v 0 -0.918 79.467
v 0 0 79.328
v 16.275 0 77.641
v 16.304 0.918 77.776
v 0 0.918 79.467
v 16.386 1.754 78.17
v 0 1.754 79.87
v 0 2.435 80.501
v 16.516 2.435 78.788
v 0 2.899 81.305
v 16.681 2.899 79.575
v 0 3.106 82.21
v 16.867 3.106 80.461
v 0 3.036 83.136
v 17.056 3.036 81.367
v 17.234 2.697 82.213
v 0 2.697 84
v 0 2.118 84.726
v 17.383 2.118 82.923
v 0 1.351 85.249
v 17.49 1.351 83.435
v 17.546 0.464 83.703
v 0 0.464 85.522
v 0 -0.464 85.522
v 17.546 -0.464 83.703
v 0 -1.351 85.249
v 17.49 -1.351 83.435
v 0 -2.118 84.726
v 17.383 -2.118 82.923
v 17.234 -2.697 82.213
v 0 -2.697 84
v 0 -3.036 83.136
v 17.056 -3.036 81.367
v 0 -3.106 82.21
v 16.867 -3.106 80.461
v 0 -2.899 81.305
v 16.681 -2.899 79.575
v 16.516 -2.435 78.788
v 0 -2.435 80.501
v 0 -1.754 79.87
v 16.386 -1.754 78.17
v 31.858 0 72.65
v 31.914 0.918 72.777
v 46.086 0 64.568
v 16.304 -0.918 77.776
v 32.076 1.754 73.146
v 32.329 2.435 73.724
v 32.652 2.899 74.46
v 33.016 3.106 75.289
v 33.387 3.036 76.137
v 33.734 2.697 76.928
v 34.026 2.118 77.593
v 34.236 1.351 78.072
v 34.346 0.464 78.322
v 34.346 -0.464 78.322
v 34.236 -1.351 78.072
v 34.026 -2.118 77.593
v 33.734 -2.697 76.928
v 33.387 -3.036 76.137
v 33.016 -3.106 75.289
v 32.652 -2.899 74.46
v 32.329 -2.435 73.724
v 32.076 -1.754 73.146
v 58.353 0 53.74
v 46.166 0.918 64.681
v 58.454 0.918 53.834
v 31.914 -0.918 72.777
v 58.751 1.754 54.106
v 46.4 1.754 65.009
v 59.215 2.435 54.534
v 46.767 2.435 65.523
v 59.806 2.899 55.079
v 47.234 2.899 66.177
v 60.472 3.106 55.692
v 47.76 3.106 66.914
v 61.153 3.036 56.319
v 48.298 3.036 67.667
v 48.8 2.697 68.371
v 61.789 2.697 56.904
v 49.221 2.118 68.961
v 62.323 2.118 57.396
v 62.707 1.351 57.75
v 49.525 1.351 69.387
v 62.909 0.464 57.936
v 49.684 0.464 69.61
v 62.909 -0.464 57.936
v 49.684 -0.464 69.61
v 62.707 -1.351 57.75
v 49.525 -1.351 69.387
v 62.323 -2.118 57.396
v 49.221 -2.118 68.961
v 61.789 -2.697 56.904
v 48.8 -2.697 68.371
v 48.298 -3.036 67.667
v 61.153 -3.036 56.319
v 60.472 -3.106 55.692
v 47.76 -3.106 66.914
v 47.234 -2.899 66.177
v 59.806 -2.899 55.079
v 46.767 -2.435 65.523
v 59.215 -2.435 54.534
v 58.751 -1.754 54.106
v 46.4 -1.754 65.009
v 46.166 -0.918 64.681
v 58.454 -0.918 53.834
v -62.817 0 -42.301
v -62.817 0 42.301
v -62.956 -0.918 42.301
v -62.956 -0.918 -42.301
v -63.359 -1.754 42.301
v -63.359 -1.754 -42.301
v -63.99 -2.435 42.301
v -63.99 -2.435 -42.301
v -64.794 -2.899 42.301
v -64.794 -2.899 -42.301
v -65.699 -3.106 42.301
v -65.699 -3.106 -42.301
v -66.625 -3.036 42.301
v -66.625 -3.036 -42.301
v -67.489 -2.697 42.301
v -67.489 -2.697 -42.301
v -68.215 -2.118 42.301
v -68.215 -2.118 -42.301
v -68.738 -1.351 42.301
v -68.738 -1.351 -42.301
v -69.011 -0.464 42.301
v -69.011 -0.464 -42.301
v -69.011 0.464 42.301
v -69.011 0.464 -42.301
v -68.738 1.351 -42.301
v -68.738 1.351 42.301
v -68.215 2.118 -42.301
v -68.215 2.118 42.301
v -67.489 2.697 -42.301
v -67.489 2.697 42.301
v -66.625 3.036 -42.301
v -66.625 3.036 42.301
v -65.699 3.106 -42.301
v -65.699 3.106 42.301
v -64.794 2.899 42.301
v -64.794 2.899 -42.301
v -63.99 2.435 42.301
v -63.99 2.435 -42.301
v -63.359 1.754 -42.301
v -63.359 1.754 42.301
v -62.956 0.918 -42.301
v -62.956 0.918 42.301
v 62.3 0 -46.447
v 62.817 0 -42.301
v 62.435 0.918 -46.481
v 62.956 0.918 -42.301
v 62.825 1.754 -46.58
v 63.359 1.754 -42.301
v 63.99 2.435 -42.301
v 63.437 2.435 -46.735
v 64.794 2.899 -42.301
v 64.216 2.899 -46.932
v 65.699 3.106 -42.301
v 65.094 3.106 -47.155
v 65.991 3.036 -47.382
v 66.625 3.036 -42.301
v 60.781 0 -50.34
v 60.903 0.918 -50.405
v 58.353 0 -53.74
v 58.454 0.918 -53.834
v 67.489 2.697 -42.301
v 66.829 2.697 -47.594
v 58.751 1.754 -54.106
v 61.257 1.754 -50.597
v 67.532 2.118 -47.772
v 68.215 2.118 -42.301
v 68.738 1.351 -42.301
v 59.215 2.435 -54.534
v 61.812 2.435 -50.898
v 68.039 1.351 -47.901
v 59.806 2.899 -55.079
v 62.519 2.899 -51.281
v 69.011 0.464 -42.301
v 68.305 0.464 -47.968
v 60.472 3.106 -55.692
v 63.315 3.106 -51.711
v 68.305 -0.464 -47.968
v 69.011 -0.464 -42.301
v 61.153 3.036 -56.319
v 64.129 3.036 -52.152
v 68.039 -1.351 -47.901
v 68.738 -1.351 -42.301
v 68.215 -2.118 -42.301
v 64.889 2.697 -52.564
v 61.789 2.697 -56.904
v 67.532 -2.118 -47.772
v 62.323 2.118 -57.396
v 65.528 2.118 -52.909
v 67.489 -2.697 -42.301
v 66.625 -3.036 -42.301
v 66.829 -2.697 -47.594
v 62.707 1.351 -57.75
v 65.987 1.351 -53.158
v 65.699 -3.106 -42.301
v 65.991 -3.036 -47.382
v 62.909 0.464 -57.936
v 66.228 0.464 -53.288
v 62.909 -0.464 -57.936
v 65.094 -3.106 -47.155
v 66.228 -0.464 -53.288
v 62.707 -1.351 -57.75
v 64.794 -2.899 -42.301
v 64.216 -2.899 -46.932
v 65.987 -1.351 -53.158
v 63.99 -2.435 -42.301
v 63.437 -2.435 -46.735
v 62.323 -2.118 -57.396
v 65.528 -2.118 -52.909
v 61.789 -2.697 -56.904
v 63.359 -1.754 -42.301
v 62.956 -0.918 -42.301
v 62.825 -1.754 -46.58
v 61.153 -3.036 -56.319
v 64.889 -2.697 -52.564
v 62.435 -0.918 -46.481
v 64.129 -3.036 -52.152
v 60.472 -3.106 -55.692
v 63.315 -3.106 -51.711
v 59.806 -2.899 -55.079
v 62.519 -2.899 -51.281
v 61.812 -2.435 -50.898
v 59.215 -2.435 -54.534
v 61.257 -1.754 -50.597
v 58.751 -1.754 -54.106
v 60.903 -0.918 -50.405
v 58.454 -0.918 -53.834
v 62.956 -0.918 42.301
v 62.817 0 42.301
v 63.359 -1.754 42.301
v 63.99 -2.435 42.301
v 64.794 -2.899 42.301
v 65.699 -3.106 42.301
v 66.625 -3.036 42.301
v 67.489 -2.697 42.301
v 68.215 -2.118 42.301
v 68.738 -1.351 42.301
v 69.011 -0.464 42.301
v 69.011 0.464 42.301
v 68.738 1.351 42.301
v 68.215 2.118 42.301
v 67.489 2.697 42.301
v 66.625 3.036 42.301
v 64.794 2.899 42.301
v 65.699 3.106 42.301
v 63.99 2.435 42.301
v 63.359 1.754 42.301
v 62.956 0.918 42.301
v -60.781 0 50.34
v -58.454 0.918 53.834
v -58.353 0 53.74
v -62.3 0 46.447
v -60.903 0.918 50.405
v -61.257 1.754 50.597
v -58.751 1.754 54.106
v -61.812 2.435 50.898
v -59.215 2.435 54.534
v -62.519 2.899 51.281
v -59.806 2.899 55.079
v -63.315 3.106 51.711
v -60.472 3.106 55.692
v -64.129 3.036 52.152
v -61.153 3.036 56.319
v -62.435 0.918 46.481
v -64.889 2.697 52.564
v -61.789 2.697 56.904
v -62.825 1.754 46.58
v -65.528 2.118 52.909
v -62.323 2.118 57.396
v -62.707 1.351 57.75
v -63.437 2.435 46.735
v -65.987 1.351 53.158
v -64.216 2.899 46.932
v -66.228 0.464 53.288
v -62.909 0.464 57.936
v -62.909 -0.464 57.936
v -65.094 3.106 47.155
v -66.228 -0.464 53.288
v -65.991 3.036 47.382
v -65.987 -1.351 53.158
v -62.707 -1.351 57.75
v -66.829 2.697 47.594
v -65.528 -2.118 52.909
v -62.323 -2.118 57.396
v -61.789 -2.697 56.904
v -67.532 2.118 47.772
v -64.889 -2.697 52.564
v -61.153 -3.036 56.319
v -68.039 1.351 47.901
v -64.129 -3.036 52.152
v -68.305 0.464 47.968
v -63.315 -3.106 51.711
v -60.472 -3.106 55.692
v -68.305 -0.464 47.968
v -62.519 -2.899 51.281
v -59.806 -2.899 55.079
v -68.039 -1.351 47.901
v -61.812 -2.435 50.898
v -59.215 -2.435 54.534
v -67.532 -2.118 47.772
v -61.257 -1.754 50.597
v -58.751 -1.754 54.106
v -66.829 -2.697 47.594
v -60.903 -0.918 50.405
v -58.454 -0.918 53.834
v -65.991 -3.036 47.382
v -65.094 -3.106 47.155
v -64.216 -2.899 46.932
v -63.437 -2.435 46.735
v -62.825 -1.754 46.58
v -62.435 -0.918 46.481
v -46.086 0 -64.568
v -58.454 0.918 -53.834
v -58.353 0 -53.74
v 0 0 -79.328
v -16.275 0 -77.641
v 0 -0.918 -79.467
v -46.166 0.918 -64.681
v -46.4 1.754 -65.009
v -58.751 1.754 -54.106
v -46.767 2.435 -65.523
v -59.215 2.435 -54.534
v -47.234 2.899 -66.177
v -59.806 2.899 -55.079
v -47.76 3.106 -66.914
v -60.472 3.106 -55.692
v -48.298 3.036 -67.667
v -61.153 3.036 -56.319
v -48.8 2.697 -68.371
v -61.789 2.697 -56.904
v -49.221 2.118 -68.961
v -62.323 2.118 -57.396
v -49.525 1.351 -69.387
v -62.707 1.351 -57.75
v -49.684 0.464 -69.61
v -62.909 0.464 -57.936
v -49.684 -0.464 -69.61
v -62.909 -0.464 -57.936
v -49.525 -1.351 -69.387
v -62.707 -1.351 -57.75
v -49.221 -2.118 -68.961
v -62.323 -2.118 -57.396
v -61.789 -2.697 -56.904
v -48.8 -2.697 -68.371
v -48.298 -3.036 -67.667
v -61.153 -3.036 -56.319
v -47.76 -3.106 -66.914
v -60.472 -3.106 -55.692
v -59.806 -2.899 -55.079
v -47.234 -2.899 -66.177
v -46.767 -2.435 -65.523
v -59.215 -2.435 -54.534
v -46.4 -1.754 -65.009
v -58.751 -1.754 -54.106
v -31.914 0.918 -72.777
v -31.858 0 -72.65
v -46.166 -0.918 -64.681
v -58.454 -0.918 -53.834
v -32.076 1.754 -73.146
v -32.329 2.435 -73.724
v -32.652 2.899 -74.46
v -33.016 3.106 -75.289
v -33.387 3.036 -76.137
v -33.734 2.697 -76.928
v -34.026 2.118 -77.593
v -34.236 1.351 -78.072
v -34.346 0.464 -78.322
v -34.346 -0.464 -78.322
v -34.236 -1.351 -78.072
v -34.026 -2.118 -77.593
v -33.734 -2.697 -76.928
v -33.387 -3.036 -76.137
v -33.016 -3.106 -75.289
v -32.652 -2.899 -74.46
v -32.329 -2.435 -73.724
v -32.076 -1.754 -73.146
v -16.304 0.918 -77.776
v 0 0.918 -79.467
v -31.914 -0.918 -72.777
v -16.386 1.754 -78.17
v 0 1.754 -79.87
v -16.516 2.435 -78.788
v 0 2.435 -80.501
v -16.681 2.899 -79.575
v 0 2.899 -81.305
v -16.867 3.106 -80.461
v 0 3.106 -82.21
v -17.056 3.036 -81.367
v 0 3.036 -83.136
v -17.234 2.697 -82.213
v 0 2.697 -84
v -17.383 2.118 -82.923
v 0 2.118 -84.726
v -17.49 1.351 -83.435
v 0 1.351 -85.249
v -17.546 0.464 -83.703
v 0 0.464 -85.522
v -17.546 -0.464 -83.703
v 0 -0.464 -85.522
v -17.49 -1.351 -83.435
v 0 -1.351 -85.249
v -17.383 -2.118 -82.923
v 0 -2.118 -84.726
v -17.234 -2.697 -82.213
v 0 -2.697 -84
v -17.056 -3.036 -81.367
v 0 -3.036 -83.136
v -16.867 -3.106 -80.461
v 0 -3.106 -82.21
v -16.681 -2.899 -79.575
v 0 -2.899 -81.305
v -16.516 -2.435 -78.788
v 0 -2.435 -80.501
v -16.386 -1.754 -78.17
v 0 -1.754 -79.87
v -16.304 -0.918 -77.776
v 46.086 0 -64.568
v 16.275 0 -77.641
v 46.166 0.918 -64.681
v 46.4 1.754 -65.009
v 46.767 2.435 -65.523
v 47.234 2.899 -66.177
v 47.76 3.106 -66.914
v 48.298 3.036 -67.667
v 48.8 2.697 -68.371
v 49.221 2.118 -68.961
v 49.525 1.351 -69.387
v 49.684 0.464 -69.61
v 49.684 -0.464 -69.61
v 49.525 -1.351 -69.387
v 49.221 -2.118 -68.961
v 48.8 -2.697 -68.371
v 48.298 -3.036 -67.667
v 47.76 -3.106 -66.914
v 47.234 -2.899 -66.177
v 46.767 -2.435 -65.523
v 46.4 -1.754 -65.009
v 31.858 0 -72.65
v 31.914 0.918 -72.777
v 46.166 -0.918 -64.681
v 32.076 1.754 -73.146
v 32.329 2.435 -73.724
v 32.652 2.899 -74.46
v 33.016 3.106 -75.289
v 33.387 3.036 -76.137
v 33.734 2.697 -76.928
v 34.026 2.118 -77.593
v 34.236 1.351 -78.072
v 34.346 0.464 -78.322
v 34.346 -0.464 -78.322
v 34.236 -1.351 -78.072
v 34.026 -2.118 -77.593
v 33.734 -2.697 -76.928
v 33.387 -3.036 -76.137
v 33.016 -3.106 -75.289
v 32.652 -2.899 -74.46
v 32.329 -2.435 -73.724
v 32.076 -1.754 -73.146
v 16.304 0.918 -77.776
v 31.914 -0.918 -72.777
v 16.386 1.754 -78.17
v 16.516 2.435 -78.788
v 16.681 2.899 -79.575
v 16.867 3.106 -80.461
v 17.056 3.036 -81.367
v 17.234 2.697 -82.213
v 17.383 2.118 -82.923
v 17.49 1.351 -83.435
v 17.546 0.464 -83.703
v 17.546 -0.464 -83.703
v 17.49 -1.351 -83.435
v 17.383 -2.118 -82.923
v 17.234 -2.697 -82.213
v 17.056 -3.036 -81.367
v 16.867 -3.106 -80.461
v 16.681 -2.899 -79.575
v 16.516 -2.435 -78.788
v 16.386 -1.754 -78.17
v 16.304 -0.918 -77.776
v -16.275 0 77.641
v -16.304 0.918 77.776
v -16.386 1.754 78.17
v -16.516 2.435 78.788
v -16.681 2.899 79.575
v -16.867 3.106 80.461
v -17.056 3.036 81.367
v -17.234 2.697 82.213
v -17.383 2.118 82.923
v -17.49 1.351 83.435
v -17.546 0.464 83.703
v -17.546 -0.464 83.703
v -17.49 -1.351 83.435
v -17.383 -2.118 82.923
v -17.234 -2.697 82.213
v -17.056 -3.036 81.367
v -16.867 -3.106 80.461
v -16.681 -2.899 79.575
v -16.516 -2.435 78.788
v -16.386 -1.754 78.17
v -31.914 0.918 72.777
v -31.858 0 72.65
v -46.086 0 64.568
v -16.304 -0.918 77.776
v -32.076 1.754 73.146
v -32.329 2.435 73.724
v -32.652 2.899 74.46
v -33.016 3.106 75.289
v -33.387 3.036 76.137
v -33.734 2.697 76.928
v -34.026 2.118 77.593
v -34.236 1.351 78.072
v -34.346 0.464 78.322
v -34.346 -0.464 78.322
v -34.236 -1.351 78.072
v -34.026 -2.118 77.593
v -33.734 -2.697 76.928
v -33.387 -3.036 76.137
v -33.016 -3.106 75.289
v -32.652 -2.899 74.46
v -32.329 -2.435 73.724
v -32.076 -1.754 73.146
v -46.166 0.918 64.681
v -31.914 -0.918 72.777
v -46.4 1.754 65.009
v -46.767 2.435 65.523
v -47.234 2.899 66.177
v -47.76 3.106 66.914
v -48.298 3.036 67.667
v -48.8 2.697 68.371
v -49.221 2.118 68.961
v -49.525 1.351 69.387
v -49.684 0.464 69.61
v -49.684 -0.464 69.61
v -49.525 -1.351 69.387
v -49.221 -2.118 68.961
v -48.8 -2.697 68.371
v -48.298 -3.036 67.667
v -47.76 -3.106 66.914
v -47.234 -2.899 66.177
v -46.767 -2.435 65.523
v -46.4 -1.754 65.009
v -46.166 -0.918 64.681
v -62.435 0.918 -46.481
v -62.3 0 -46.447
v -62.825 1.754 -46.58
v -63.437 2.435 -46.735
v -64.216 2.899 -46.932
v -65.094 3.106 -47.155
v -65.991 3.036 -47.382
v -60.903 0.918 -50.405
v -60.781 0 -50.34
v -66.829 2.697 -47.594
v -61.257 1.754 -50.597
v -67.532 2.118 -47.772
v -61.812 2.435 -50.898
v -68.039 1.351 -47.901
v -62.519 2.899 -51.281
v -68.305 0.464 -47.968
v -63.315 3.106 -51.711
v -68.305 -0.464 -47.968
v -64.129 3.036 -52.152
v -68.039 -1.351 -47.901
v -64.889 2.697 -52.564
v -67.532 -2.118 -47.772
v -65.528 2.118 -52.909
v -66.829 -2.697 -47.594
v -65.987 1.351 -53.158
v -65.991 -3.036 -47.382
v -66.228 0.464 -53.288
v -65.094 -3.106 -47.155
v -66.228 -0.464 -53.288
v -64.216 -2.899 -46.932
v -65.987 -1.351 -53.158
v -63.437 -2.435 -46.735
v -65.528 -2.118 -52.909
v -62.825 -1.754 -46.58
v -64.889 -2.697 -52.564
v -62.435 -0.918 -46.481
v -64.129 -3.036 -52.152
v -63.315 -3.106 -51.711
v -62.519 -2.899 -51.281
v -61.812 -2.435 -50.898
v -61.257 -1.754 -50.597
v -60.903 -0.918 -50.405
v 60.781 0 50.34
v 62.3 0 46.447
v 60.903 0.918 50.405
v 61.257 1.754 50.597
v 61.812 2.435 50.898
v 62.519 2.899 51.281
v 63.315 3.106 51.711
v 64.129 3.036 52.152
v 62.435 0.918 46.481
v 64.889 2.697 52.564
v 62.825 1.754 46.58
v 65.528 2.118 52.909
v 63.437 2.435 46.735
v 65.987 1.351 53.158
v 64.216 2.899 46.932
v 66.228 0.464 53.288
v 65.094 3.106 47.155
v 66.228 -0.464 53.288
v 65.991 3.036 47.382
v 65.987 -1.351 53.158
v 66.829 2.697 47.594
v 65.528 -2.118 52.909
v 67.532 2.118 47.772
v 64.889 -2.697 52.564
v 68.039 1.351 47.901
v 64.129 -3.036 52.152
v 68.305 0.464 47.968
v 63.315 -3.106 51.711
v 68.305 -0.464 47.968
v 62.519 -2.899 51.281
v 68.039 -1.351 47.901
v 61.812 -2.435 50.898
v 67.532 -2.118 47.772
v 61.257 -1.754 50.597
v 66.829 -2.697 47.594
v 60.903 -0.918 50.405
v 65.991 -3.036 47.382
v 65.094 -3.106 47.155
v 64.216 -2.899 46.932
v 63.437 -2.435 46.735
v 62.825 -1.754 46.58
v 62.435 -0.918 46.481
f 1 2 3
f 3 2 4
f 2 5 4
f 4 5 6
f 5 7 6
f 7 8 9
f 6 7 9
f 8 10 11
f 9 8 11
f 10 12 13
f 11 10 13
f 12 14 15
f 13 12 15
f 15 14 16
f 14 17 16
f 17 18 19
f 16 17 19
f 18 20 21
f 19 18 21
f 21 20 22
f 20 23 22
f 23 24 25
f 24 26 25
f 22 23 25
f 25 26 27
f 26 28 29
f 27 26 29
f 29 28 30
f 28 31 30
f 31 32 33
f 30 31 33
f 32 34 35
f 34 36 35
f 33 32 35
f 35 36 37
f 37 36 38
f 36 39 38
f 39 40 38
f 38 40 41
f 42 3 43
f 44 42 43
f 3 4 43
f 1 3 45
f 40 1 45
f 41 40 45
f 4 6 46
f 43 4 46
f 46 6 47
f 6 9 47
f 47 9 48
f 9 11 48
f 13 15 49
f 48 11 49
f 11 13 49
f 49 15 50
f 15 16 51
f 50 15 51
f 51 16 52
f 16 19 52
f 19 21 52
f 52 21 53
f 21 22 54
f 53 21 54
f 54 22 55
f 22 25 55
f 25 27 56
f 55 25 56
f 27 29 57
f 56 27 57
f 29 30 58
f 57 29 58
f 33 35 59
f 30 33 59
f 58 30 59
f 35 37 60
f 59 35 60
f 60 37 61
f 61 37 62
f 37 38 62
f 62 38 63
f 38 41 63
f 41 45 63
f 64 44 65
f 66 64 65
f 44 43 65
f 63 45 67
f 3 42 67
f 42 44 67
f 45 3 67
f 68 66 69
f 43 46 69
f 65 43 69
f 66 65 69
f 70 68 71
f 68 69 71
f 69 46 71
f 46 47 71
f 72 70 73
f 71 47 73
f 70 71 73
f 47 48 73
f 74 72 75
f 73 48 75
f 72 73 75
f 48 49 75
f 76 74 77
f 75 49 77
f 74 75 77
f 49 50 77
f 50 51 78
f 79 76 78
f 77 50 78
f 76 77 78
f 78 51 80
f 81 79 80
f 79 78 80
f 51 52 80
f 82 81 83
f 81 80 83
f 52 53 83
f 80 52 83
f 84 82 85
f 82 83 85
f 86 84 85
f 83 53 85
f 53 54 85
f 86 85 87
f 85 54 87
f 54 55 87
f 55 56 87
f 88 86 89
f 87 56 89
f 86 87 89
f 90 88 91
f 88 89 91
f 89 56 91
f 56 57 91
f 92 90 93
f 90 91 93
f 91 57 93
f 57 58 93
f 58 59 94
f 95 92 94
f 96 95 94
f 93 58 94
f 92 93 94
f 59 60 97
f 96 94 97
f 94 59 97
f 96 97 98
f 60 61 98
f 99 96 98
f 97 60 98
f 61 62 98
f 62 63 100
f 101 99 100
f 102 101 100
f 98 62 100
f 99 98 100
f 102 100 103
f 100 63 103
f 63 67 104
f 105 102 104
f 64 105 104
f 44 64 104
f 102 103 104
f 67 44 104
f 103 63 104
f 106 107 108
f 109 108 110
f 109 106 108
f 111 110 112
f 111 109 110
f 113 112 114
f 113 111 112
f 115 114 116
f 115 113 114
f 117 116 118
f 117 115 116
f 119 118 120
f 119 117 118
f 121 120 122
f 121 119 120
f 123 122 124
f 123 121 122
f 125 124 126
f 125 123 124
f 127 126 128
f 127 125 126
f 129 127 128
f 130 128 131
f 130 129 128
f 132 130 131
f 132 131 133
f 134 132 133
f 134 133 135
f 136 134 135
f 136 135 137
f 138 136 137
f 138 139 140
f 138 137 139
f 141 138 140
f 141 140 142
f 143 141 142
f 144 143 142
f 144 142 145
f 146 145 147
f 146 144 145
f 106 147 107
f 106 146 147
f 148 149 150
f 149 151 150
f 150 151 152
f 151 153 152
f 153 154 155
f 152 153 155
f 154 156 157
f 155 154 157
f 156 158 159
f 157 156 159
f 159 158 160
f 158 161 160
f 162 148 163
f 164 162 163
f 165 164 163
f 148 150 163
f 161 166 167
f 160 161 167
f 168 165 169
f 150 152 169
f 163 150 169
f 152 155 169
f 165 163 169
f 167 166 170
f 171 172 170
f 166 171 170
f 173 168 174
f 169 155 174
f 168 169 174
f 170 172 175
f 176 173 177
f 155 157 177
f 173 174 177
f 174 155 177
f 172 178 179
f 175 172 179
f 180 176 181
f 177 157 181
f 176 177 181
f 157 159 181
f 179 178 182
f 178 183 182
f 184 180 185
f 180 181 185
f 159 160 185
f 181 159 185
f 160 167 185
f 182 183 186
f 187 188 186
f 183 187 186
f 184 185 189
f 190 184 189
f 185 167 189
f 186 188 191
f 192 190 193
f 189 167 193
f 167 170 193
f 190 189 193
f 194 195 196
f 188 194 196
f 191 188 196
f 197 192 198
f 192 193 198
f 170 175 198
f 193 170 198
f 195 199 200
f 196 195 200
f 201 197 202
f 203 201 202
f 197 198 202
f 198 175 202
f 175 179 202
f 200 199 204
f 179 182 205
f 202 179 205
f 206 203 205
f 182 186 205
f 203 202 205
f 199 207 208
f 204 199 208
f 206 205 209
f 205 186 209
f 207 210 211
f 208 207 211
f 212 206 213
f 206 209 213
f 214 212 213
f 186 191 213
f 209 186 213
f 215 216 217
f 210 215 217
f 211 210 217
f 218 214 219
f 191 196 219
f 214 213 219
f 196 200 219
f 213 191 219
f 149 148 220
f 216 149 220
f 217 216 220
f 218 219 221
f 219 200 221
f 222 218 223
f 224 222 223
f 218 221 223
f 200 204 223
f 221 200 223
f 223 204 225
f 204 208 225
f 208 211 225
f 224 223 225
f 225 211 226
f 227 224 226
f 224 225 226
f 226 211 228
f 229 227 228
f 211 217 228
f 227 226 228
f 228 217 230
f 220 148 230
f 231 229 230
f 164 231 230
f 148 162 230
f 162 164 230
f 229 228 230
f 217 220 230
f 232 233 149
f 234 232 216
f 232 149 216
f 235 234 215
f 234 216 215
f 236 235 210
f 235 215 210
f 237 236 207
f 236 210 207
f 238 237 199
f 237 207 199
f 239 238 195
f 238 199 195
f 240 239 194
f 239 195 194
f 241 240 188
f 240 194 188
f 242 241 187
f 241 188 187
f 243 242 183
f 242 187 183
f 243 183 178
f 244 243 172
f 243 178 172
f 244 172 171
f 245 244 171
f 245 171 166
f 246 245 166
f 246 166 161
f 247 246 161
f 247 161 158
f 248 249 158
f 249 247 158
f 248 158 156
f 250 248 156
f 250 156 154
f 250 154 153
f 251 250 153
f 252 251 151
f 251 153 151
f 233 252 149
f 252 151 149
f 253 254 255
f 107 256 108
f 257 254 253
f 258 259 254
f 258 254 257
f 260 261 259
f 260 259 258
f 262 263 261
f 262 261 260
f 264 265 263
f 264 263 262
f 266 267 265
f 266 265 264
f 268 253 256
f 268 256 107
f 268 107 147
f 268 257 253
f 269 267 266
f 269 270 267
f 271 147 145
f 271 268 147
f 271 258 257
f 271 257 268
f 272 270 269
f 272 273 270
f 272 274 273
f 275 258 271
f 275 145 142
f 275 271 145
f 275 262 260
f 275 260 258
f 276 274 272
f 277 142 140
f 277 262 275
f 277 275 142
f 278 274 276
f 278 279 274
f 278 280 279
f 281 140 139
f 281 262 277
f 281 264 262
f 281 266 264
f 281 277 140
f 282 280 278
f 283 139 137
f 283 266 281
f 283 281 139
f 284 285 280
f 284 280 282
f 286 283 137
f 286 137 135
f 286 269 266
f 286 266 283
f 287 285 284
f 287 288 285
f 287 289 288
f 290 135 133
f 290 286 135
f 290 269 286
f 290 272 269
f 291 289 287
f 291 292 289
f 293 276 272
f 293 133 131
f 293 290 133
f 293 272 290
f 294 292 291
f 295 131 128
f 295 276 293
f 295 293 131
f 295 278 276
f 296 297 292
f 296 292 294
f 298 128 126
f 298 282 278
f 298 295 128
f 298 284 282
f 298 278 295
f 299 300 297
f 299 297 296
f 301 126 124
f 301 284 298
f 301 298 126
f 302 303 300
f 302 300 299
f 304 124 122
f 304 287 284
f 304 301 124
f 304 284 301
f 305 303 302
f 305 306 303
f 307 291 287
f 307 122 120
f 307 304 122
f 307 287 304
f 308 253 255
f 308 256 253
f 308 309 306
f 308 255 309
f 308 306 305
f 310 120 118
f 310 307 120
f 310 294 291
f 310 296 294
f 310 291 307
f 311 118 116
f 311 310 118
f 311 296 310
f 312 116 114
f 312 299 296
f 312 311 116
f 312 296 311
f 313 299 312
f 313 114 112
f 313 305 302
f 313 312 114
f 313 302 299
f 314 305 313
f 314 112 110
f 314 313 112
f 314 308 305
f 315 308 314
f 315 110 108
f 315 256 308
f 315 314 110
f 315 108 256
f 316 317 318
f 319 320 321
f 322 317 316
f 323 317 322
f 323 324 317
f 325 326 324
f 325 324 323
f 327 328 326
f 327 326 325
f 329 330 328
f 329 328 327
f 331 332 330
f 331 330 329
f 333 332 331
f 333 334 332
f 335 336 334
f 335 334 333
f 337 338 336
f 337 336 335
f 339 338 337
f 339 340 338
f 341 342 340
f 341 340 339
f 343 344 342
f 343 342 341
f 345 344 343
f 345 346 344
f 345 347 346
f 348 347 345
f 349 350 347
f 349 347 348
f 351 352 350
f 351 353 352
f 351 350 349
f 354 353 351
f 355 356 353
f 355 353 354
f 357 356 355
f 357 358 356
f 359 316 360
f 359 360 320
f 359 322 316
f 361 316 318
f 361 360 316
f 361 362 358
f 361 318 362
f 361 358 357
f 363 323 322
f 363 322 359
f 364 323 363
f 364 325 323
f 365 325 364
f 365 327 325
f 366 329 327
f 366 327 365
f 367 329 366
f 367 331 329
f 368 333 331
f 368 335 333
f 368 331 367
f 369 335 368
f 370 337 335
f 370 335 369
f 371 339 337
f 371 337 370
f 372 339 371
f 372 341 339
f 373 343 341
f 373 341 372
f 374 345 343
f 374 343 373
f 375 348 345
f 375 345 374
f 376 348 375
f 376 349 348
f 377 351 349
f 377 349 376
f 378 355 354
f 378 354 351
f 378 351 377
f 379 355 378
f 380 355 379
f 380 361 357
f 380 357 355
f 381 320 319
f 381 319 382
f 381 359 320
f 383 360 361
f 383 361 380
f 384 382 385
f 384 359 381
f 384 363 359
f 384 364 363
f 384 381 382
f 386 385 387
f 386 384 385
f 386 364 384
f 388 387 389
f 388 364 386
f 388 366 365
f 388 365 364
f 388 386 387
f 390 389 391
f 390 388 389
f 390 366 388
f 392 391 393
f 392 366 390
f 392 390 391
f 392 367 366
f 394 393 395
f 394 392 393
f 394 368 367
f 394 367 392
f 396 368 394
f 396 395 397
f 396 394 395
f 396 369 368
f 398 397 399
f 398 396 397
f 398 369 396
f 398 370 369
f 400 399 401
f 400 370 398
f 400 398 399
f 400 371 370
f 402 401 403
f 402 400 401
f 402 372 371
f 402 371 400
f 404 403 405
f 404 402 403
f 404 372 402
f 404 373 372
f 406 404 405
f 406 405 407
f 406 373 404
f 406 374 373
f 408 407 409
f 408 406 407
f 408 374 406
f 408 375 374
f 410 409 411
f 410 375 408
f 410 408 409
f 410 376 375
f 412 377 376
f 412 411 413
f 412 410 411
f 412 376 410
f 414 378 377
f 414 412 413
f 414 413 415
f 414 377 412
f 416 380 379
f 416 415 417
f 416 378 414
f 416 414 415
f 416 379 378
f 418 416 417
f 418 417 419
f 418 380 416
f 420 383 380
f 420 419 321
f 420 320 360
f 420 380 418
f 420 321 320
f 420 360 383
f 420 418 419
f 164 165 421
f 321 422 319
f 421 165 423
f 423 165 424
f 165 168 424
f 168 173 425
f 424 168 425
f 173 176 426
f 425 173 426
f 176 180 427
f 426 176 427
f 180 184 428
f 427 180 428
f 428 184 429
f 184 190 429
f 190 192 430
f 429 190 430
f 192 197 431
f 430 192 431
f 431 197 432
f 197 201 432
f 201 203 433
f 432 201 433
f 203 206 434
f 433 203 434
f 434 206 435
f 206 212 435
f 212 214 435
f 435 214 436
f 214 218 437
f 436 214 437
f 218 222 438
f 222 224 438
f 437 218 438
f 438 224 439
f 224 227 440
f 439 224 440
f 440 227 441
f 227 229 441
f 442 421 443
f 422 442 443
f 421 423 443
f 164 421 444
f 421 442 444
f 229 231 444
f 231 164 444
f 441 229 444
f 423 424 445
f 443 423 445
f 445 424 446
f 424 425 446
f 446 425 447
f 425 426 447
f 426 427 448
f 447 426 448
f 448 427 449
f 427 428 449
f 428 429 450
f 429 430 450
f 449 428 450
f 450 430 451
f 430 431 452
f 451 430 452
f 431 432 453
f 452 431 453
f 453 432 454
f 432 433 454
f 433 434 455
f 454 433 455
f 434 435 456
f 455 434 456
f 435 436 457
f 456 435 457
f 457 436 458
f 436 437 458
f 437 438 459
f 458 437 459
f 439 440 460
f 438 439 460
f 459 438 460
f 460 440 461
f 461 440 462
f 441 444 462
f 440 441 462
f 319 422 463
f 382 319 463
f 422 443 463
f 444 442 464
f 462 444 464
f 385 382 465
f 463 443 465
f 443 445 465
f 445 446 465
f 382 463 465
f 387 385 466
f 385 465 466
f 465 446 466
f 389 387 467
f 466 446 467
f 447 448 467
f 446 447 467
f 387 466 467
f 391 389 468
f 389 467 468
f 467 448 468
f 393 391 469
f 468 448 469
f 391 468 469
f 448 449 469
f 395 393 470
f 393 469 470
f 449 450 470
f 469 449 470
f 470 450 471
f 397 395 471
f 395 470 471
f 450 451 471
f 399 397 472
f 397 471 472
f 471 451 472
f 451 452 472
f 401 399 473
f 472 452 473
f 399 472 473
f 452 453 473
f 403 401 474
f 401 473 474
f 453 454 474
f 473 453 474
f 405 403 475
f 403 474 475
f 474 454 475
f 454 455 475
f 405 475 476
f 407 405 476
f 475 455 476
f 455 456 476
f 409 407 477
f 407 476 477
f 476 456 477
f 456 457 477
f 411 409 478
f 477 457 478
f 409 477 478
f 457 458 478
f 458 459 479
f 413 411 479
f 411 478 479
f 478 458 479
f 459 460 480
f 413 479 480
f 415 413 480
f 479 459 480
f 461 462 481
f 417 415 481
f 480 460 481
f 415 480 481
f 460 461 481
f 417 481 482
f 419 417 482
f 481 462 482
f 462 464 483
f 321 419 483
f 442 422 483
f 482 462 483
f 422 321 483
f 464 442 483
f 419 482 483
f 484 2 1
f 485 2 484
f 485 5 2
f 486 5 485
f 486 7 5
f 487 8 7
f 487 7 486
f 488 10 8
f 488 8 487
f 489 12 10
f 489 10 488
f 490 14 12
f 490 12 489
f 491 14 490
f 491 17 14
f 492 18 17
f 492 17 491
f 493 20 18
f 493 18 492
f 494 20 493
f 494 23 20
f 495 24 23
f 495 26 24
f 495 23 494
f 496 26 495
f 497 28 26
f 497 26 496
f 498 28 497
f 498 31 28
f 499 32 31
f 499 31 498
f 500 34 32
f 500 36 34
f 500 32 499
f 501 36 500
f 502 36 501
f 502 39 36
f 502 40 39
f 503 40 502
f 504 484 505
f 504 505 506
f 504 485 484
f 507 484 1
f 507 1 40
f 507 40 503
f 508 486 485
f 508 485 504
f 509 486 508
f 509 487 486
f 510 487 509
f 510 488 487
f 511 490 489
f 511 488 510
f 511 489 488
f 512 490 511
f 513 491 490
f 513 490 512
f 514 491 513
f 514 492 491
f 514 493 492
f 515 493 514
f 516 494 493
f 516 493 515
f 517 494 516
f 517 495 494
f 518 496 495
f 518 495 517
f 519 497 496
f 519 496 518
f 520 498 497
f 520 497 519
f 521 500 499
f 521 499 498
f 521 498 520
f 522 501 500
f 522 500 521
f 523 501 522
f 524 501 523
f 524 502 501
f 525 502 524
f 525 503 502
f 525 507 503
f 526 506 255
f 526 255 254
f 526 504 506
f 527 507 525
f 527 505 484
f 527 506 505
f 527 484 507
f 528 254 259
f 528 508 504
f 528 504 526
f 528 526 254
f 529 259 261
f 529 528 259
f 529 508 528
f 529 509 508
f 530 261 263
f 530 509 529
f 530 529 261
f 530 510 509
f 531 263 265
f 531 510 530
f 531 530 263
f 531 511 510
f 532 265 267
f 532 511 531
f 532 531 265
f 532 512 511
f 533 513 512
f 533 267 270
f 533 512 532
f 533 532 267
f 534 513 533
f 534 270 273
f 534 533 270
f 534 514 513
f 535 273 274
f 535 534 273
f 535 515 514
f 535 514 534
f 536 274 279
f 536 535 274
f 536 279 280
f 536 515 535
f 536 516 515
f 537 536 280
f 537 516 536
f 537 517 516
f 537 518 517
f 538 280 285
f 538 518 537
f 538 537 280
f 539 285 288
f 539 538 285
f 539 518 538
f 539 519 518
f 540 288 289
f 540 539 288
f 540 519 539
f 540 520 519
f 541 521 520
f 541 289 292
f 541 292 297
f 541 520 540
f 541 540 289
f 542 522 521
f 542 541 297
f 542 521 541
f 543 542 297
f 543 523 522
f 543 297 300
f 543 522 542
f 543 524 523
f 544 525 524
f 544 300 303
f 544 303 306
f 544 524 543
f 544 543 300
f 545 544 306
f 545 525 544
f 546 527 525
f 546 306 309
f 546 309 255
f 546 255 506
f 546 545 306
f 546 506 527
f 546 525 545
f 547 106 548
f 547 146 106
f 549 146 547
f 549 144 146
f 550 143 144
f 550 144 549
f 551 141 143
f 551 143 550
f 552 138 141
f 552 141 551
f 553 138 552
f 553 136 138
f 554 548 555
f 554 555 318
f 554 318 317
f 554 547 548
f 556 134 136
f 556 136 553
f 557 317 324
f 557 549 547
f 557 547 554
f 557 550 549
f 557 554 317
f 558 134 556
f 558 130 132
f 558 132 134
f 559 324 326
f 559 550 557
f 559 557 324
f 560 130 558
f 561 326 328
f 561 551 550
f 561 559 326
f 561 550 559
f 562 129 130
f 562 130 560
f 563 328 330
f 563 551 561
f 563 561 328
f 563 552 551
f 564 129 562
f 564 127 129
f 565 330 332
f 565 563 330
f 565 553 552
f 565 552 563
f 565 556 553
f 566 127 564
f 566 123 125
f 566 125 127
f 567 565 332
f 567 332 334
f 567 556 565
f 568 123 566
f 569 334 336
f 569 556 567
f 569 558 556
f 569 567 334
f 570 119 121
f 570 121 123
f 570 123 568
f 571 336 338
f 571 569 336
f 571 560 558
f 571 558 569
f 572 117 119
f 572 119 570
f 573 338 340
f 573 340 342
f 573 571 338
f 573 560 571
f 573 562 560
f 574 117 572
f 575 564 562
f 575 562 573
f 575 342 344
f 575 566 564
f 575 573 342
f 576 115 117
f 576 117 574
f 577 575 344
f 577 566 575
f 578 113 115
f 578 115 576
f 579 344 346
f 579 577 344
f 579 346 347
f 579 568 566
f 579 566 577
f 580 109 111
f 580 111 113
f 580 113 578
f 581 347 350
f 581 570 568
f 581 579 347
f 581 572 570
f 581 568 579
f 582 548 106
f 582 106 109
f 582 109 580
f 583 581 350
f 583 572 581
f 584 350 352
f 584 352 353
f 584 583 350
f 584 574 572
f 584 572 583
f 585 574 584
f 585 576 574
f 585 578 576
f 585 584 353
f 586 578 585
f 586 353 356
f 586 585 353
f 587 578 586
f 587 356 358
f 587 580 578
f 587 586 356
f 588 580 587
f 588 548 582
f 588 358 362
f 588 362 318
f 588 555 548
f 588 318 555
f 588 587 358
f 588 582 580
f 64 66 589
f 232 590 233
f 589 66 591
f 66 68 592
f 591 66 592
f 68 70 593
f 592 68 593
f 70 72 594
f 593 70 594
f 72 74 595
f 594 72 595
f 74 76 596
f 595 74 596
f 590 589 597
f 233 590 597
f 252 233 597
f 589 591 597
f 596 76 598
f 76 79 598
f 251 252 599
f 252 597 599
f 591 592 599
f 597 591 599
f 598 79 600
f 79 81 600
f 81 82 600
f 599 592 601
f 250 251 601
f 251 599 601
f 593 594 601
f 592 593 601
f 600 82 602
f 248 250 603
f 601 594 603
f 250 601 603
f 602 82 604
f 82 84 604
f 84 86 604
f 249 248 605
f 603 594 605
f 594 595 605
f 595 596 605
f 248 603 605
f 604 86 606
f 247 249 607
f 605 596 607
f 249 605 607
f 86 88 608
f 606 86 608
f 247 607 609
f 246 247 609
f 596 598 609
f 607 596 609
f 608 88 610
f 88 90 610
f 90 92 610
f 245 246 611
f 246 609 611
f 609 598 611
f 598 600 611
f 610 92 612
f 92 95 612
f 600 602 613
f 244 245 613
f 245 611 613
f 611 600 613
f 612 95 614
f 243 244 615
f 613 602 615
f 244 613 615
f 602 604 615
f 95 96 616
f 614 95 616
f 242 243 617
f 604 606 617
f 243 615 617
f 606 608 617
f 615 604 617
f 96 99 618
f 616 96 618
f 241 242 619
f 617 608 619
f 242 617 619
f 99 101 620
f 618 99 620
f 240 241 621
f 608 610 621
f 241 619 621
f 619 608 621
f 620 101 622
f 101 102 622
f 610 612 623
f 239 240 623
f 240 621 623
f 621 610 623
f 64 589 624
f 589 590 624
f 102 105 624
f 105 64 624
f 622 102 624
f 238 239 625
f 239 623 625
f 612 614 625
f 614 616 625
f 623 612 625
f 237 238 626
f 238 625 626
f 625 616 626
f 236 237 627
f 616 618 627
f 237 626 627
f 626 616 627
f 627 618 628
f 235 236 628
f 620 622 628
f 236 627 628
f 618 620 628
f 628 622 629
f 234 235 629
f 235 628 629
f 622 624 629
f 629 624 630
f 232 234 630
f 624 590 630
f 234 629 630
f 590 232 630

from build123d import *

# Parameters (mm, degrees)
SKIZZE2_R = 3.114282512


with BuildPart() as part:
    # Austragung1: sweep along a path in Skizze1
    with BuildLine(Plane(origin=(0, 0, 0), x_dir=(1, 0, 0), z_dir=(0, 1, 0))) as austragung1_path:
        ThreePointArc((0, -82.442660512), (-33.108990695, -75.502231804), (-60.643425983, -55.849504539))
        ThreePointArc((-60.643425983, -55.849504539), (-64.562830296, -49.572910331), (-65.931764421, -42.300814045))
        Line((-65.931764421, -42.300814045), (-65.931764421, 42.300814045))
        ThreePointArc((-65.931764421, 42.300814045), (-64.562830296, 49.572910331), (-60.643425983, 55.849504539))
        ThreePointArc((-60.643425983, 55.849504539), (-33.108990695, 75.502231804), (0, 82.442660512))
    # Skizze2 → Austragung1 (sweep)
    with BuildSketch(Plane(origin=(0, 0, 0), x_dir=(0, 0, -1), z_dir=(1, 0, 0))):
        with Locations((-82.442660512, 0)):
            Circle(SKIZZE2_R)
    sweep(path=austragung1_path.line)

    # Spiegeln1: part across plane


with BuildPart() as part_1:
    add(part.part)
    add(part.part.mirror(Plane(origin=(0, 0, 82.442660512), x_dir=(0, 0, 1), z_dir=(1, 0, 0))))


solid = part_1.part
